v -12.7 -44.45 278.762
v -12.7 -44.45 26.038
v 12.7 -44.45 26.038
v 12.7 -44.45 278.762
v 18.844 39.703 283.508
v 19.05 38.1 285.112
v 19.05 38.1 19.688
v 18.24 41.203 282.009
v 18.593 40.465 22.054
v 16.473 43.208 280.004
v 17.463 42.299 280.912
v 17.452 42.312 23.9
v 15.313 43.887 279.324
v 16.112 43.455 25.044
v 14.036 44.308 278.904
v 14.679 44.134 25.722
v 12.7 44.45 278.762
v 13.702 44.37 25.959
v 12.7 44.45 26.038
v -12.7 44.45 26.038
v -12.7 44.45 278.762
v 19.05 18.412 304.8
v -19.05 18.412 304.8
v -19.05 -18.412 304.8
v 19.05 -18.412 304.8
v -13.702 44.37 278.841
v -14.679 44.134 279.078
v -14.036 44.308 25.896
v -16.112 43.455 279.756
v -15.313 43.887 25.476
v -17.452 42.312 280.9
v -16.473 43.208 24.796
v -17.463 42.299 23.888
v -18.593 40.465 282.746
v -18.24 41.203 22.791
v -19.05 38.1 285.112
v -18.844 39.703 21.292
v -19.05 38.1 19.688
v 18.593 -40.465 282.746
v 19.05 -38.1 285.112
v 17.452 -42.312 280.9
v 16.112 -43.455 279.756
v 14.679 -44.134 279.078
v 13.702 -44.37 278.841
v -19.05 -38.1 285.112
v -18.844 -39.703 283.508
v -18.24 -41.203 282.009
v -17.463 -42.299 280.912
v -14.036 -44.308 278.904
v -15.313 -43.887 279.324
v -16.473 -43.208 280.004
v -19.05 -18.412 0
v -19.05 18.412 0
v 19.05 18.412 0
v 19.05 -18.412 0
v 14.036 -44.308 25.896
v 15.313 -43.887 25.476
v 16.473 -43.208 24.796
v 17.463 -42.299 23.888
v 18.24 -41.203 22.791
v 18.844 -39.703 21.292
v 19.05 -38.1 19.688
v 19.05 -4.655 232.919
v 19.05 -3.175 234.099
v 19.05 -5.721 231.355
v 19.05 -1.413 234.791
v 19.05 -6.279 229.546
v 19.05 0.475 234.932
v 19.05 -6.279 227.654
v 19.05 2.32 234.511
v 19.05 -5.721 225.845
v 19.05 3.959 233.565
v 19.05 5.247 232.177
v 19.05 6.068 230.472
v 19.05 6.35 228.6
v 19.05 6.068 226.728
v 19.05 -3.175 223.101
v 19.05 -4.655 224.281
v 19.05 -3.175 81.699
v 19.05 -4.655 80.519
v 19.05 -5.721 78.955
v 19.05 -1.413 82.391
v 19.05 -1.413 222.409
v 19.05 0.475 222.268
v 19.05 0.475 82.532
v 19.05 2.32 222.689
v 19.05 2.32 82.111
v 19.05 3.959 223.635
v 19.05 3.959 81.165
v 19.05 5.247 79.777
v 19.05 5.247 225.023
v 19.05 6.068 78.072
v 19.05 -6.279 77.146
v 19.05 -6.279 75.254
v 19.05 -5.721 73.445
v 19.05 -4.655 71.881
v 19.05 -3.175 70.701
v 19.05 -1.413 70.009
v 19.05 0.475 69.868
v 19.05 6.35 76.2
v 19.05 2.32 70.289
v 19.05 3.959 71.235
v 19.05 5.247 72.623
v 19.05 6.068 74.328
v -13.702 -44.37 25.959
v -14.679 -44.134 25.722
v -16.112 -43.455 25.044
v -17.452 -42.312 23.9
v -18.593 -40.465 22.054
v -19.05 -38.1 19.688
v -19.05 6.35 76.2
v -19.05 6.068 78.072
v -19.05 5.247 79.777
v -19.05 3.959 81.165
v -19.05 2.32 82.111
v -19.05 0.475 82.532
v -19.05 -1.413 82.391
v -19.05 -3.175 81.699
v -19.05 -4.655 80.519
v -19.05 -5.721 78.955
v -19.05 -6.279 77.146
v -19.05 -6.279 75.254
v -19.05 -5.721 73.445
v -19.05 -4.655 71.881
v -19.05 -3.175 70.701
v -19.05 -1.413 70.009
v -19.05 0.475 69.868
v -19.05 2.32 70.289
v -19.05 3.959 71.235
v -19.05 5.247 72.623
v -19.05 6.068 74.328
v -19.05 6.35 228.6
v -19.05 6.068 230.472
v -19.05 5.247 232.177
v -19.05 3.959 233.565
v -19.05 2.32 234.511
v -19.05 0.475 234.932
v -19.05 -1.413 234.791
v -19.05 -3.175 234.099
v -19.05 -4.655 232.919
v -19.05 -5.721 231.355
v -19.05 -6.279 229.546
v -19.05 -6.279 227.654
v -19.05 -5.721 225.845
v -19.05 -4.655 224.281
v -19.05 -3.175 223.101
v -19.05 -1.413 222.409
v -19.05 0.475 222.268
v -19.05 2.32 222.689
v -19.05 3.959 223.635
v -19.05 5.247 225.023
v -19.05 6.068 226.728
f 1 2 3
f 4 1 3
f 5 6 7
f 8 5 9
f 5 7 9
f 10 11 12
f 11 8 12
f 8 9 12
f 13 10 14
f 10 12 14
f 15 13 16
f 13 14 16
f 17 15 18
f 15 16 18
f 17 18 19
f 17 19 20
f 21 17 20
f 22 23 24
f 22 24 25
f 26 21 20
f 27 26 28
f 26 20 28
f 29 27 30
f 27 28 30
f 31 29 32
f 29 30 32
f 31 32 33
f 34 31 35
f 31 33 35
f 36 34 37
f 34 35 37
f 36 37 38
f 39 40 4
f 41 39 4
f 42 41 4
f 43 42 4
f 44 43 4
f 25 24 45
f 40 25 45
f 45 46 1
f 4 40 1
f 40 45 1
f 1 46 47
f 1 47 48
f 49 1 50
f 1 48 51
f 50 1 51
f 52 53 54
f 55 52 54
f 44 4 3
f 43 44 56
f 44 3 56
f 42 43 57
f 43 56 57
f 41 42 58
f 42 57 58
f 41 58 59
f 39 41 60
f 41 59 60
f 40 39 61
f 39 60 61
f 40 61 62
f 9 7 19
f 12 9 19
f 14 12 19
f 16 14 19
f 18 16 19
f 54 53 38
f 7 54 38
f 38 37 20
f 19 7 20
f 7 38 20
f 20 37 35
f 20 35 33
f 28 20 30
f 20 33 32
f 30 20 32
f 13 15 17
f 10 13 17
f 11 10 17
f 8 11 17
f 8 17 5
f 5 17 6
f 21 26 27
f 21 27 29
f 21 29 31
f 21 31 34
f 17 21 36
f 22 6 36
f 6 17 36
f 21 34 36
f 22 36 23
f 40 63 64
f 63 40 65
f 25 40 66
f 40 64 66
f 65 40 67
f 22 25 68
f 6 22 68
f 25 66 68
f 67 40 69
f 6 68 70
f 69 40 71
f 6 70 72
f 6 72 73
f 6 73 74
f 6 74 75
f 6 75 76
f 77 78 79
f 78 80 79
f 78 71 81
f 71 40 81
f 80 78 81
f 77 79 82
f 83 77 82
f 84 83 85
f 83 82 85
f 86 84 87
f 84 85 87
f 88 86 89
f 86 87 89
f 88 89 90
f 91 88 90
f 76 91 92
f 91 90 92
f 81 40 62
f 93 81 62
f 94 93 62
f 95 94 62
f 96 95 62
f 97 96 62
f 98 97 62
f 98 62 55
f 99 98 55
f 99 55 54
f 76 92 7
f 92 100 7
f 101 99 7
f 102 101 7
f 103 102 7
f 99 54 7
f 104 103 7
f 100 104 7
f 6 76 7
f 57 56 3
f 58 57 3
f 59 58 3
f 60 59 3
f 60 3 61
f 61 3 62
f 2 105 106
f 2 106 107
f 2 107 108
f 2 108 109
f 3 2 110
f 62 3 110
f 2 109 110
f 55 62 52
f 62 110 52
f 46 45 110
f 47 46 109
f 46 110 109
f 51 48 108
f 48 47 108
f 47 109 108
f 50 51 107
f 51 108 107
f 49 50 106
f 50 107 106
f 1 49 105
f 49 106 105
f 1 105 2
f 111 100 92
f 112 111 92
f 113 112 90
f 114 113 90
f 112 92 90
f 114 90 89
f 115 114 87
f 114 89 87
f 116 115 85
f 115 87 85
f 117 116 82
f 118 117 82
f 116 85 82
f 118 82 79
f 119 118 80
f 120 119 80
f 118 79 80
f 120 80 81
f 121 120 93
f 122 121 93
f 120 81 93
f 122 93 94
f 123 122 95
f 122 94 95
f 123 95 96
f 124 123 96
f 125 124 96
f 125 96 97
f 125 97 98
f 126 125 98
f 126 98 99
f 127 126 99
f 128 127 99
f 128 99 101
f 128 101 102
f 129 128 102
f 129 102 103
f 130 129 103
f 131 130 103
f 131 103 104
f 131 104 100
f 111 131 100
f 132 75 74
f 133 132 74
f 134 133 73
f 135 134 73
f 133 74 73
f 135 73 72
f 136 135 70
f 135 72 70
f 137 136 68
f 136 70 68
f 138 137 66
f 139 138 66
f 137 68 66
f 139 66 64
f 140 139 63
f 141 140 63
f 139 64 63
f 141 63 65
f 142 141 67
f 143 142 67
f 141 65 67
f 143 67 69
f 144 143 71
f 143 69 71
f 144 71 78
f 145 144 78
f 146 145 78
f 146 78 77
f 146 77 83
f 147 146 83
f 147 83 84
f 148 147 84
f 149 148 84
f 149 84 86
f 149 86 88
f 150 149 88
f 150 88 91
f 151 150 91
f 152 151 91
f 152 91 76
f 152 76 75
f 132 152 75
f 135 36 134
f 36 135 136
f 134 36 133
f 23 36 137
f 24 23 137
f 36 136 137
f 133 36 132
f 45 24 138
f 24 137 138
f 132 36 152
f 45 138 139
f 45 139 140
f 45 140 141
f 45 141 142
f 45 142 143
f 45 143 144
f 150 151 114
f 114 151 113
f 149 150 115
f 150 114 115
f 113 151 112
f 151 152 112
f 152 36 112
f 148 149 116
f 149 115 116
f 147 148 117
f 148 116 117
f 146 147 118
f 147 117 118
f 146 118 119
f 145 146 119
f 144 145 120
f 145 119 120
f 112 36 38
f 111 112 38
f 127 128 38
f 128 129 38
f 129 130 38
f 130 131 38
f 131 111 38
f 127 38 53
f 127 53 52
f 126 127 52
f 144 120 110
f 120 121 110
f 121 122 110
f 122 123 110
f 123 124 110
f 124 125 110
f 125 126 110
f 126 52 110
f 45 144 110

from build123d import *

# Parameters (mm, degrees)
F1_DEPTH = 304.8
F3_DEPTH = 50.8
F4_D     = 12.7


with BuildPart() as f1:
    # F0 (on Top) → F1 (new body)
    with BuildSketch(Plane.XY):
        with BuildLine():
            Line((-12.7, -44.45), (12.7, -44.45))
            ThreePointArc((12.7, -44.45), (17.1901280605, -42.5901280605), (19.05, -38.1))
            Line((19.05, -38.1), (19.05, 38.1))
            ThreePointArc((19.05, 38.1), (17.1901280605, 42.5901280605), (12.7, 44.45))
            Line((12.7, 44.45), (-12.7, 44.45))
            ThreePointArc((-12.7, 44.45), (-17.1901280605, 42.5901280605), (-19.05, 38.1))
            Line((-19.05, 38.1), (-19.05, -38.1))
            ThreePointArc((-19.05, -38.1), (-17.1901280605, -42.5901280605), (-12.7, -44.45))
        make_face()
    extrude(amount=F1_DEPTH)

    # F2 (on face) → F3 (cut)
    with BuildSketch(Plane(origin=(-19.05, 0, 0), x_dir=(0, -1, 0), z_dir=(-1, 0, 0))):
        Polygon((-38.1, 304.8), (-44.45, 304.8), (-44.45, 278.7617928475), (-38.1, 285.1117928475), align=None)
        Polygon((-18.4117928475, 304.8), (-38.1, 304.8), (-38.1, 285.1117928475), align=None)
        Polygon((-38.1, 19.6882071525), (-44.45, 26.0382071525), (-44.45, 0), (-38.1, 0), align=None)
        Polygon((-18.4117928475, 0), (-38.1, 19.6882071525), (-38.1, 0), align=None)
        Polygon((38.1, 304.8), (18.4117928475, 304.8), (38.1, 285.1117928475), align=None)
        Polygon((44.45, 304.8), (38.1, 304.8), (38.1, 285.1117928475), (44.45, 278.7617928475), align=None)
        Polygon((38.1, 19.6882071525), (18.4117928475, 0), (38.1, 0), align=None)
        Polygon((44.45, 26.0382071525), (38.1, 19.6882071525), (38.1, 0), (44.45, 0), align=None)
    extrude(amount=-F3_DEPTH, mode=Mode.SUBTRACT)

    # F4 (through all)
    with Locations(Plane(origin=(-19.05, 0, 0), x_dir=(0, -1, 0), z_dir=(-1, 0, 0))):
        with Locations((0, 76.2), (0, 228.6)):
            Hole(F4_D / 2)


solid = f1.part
